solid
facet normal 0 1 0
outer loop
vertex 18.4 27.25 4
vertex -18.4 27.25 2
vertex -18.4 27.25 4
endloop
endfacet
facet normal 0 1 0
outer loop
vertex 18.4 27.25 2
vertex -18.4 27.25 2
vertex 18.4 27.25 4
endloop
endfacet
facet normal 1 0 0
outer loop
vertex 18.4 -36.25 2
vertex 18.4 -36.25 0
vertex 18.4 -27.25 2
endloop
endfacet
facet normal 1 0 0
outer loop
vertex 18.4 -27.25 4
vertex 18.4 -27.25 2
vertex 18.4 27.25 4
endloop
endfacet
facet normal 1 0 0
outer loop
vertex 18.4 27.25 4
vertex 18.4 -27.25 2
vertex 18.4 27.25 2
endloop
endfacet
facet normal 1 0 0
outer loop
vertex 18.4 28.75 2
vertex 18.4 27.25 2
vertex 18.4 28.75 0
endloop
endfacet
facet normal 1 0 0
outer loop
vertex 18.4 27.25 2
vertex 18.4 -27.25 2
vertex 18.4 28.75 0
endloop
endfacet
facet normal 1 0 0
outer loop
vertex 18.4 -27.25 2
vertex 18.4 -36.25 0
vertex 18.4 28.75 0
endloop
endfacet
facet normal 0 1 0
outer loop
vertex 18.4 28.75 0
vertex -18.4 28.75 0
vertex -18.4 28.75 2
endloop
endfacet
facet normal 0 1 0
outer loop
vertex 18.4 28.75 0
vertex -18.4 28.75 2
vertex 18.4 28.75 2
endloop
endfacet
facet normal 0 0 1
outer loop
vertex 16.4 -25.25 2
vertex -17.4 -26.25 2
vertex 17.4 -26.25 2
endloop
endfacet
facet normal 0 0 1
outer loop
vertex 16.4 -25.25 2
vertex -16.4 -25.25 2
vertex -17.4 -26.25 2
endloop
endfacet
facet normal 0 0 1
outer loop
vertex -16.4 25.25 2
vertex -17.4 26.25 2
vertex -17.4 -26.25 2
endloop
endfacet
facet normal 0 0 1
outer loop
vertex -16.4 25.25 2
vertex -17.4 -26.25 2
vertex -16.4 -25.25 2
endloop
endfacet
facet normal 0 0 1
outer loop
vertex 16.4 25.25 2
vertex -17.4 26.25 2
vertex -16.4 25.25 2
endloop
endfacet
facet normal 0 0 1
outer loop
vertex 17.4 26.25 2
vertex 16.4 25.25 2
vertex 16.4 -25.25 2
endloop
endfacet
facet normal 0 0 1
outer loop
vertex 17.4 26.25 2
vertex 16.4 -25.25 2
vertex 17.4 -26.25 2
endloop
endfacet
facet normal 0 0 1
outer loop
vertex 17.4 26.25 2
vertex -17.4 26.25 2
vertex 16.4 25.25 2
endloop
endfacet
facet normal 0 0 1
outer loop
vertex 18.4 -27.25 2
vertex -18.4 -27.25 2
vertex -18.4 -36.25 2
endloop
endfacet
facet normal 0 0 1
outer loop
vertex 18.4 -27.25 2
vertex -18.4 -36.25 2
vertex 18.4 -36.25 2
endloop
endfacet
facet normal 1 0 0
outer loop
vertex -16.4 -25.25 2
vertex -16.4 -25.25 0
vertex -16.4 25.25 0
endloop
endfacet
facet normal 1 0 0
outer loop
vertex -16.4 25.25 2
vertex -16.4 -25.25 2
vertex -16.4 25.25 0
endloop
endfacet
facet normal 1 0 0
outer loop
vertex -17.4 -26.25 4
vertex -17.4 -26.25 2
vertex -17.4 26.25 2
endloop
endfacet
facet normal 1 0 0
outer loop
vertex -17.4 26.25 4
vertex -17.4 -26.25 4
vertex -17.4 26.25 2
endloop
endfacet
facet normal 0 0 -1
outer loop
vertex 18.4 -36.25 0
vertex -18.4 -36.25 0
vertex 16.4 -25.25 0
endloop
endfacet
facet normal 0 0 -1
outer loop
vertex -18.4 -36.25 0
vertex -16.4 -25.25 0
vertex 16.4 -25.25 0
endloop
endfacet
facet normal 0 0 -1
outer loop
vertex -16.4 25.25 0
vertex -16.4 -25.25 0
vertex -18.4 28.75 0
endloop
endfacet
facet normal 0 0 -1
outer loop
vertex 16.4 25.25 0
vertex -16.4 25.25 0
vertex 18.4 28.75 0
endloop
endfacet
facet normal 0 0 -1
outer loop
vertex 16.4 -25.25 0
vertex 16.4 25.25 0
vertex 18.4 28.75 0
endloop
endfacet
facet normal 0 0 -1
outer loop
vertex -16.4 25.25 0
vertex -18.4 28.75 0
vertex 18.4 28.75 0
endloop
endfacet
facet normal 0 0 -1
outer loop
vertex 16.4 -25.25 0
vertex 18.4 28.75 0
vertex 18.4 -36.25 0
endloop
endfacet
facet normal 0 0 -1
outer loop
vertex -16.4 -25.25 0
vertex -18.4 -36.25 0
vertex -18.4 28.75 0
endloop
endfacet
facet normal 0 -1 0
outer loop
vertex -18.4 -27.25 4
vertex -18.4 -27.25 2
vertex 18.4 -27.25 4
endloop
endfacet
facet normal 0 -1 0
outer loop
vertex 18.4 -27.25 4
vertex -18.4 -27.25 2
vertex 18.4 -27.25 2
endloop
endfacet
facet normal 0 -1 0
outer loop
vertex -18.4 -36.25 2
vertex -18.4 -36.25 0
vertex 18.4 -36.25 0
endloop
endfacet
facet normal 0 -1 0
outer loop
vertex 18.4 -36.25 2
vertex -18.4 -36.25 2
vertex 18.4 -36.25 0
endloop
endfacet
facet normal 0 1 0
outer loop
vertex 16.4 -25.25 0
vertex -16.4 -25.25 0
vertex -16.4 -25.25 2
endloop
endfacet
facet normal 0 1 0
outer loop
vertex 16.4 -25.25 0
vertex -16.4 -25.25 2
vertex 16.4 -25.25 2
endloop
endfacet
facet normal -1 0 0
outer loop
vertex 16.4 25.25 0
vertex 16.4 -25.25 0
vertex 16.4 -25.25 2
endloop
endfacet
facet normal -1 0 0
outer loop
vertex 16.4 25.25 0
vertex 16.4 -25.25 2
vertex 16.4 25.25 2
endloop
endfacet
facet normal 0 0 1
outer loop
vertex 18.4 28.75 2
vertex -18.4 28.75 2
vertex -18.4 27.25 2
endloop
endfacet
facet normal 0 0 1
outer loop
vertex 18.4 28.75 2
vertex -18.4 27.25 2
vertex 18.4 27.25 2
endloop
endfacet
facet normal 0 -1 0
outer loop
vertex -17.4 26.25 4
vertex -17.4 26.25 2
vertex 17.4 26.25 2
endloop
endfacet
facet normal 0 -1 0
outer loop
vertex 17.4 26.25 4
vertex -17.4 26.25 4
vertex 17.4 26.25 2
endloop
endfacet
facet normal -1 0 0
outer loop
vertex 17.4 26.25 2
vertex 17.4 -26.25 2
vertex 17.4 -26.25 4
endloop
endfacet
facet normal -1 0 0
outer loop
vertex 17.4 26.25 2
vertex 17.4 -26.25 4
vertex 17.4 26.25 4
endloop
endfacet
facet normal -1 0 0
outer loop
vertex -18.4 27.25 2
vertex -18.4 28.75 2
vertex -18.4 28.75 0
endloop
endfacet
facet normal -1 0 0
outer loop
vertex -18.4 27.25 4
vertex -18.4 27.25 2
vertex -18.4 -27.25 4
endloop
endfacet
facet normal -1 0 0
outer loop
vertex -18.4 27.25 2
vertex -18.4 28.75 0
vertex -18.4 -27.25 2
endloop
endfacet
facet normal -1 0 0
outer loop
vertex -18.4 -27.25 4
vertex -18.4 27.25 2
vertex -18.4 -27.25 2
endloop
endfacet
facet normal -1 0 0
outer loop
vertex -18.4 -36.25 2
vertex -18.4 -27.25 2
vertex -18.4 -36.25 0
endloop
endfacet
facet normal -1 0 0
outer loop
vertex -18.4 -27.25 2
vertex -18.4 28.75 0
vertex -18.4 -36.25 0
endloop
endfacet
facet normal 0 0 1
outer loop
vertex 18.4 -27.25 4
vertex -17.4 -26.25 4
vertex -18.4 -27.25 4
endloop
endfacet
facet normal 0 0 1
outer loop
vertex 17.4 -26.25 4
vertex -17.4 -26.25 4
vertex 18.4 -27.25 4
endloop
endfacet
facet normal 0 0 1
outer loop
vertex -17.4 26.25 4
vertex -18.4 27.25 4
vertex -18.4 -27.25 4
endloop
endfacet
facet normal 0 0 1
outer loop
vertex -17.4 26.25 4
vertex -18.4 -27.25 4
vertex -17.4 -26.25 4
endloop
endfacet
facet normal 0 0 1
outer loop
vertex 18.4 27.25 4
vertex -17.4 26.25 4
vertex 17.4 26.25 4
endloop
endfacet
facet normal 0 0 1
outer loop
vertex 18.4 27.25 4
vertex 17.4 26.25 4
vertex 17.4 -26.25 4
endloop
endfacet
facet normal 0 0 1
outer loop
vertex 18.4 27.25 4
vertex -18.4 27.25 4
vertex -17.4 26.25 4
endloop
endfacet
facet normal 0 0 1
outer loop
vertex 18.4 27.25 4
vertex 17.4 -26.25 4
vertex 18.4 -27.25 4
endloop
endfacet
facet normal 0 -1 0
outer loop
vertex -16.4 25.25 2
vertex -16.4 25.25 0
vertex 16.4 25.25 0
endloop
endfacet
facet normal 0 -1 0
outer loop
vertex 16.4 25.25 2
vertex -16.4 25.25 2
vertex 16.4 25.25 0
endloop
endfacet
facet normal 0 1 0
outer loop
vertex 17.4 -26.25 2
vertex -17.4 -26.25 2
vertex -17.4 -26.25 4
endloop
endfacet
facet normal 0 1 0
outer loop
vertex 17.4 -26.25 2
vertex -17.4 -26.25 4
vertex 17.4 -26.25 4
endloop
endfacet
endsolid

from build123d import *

# Parameters (mm, degrees)
F0_W     = 36.8
F0_H     = 54.5
F0_W_2   = 34.8
F0_H_2   = 52.5
F0_H_3   = 1.5
F0_H_4   = 9
F0_W_3   = 32.8
F0_H_5   = 50.5
F1_DEPTH = 2
F2_DEPTH = 4


with BuildPart() as f1:
    # F0 (on Top) → F1 (new body)
    with BuildSketch(Plane.XY):
        Rectangle(F0_W, F0_H)
        Rectangle(F0_W_2, F0_H_2, mode=Mode.SUBTRACT)
        with Locations((0, 28)):
            Rectangle(F0_W, F0_H_3)
        with Locations((0, -31.75)):
            Rectangle(F0_W, F0_H_4)
        Rectangle(F0_W_2, F0_H_2)
        Rectangle(F0_W_3, F0_H_5, mode=Mode.SUBTRACT)
    extrude(amount=F1_DEPTH)

    # F0 (on Top) → F2 (join)
    with BuildSketch(Plane.XY):
        Rectangle(F0_W, F0_H)
        Rectangle(F0_W_2, F0_H_2, mode=Mode.SUBTRACT)
    extrude(amount=F2_DEPTH)


solid = f1.part
